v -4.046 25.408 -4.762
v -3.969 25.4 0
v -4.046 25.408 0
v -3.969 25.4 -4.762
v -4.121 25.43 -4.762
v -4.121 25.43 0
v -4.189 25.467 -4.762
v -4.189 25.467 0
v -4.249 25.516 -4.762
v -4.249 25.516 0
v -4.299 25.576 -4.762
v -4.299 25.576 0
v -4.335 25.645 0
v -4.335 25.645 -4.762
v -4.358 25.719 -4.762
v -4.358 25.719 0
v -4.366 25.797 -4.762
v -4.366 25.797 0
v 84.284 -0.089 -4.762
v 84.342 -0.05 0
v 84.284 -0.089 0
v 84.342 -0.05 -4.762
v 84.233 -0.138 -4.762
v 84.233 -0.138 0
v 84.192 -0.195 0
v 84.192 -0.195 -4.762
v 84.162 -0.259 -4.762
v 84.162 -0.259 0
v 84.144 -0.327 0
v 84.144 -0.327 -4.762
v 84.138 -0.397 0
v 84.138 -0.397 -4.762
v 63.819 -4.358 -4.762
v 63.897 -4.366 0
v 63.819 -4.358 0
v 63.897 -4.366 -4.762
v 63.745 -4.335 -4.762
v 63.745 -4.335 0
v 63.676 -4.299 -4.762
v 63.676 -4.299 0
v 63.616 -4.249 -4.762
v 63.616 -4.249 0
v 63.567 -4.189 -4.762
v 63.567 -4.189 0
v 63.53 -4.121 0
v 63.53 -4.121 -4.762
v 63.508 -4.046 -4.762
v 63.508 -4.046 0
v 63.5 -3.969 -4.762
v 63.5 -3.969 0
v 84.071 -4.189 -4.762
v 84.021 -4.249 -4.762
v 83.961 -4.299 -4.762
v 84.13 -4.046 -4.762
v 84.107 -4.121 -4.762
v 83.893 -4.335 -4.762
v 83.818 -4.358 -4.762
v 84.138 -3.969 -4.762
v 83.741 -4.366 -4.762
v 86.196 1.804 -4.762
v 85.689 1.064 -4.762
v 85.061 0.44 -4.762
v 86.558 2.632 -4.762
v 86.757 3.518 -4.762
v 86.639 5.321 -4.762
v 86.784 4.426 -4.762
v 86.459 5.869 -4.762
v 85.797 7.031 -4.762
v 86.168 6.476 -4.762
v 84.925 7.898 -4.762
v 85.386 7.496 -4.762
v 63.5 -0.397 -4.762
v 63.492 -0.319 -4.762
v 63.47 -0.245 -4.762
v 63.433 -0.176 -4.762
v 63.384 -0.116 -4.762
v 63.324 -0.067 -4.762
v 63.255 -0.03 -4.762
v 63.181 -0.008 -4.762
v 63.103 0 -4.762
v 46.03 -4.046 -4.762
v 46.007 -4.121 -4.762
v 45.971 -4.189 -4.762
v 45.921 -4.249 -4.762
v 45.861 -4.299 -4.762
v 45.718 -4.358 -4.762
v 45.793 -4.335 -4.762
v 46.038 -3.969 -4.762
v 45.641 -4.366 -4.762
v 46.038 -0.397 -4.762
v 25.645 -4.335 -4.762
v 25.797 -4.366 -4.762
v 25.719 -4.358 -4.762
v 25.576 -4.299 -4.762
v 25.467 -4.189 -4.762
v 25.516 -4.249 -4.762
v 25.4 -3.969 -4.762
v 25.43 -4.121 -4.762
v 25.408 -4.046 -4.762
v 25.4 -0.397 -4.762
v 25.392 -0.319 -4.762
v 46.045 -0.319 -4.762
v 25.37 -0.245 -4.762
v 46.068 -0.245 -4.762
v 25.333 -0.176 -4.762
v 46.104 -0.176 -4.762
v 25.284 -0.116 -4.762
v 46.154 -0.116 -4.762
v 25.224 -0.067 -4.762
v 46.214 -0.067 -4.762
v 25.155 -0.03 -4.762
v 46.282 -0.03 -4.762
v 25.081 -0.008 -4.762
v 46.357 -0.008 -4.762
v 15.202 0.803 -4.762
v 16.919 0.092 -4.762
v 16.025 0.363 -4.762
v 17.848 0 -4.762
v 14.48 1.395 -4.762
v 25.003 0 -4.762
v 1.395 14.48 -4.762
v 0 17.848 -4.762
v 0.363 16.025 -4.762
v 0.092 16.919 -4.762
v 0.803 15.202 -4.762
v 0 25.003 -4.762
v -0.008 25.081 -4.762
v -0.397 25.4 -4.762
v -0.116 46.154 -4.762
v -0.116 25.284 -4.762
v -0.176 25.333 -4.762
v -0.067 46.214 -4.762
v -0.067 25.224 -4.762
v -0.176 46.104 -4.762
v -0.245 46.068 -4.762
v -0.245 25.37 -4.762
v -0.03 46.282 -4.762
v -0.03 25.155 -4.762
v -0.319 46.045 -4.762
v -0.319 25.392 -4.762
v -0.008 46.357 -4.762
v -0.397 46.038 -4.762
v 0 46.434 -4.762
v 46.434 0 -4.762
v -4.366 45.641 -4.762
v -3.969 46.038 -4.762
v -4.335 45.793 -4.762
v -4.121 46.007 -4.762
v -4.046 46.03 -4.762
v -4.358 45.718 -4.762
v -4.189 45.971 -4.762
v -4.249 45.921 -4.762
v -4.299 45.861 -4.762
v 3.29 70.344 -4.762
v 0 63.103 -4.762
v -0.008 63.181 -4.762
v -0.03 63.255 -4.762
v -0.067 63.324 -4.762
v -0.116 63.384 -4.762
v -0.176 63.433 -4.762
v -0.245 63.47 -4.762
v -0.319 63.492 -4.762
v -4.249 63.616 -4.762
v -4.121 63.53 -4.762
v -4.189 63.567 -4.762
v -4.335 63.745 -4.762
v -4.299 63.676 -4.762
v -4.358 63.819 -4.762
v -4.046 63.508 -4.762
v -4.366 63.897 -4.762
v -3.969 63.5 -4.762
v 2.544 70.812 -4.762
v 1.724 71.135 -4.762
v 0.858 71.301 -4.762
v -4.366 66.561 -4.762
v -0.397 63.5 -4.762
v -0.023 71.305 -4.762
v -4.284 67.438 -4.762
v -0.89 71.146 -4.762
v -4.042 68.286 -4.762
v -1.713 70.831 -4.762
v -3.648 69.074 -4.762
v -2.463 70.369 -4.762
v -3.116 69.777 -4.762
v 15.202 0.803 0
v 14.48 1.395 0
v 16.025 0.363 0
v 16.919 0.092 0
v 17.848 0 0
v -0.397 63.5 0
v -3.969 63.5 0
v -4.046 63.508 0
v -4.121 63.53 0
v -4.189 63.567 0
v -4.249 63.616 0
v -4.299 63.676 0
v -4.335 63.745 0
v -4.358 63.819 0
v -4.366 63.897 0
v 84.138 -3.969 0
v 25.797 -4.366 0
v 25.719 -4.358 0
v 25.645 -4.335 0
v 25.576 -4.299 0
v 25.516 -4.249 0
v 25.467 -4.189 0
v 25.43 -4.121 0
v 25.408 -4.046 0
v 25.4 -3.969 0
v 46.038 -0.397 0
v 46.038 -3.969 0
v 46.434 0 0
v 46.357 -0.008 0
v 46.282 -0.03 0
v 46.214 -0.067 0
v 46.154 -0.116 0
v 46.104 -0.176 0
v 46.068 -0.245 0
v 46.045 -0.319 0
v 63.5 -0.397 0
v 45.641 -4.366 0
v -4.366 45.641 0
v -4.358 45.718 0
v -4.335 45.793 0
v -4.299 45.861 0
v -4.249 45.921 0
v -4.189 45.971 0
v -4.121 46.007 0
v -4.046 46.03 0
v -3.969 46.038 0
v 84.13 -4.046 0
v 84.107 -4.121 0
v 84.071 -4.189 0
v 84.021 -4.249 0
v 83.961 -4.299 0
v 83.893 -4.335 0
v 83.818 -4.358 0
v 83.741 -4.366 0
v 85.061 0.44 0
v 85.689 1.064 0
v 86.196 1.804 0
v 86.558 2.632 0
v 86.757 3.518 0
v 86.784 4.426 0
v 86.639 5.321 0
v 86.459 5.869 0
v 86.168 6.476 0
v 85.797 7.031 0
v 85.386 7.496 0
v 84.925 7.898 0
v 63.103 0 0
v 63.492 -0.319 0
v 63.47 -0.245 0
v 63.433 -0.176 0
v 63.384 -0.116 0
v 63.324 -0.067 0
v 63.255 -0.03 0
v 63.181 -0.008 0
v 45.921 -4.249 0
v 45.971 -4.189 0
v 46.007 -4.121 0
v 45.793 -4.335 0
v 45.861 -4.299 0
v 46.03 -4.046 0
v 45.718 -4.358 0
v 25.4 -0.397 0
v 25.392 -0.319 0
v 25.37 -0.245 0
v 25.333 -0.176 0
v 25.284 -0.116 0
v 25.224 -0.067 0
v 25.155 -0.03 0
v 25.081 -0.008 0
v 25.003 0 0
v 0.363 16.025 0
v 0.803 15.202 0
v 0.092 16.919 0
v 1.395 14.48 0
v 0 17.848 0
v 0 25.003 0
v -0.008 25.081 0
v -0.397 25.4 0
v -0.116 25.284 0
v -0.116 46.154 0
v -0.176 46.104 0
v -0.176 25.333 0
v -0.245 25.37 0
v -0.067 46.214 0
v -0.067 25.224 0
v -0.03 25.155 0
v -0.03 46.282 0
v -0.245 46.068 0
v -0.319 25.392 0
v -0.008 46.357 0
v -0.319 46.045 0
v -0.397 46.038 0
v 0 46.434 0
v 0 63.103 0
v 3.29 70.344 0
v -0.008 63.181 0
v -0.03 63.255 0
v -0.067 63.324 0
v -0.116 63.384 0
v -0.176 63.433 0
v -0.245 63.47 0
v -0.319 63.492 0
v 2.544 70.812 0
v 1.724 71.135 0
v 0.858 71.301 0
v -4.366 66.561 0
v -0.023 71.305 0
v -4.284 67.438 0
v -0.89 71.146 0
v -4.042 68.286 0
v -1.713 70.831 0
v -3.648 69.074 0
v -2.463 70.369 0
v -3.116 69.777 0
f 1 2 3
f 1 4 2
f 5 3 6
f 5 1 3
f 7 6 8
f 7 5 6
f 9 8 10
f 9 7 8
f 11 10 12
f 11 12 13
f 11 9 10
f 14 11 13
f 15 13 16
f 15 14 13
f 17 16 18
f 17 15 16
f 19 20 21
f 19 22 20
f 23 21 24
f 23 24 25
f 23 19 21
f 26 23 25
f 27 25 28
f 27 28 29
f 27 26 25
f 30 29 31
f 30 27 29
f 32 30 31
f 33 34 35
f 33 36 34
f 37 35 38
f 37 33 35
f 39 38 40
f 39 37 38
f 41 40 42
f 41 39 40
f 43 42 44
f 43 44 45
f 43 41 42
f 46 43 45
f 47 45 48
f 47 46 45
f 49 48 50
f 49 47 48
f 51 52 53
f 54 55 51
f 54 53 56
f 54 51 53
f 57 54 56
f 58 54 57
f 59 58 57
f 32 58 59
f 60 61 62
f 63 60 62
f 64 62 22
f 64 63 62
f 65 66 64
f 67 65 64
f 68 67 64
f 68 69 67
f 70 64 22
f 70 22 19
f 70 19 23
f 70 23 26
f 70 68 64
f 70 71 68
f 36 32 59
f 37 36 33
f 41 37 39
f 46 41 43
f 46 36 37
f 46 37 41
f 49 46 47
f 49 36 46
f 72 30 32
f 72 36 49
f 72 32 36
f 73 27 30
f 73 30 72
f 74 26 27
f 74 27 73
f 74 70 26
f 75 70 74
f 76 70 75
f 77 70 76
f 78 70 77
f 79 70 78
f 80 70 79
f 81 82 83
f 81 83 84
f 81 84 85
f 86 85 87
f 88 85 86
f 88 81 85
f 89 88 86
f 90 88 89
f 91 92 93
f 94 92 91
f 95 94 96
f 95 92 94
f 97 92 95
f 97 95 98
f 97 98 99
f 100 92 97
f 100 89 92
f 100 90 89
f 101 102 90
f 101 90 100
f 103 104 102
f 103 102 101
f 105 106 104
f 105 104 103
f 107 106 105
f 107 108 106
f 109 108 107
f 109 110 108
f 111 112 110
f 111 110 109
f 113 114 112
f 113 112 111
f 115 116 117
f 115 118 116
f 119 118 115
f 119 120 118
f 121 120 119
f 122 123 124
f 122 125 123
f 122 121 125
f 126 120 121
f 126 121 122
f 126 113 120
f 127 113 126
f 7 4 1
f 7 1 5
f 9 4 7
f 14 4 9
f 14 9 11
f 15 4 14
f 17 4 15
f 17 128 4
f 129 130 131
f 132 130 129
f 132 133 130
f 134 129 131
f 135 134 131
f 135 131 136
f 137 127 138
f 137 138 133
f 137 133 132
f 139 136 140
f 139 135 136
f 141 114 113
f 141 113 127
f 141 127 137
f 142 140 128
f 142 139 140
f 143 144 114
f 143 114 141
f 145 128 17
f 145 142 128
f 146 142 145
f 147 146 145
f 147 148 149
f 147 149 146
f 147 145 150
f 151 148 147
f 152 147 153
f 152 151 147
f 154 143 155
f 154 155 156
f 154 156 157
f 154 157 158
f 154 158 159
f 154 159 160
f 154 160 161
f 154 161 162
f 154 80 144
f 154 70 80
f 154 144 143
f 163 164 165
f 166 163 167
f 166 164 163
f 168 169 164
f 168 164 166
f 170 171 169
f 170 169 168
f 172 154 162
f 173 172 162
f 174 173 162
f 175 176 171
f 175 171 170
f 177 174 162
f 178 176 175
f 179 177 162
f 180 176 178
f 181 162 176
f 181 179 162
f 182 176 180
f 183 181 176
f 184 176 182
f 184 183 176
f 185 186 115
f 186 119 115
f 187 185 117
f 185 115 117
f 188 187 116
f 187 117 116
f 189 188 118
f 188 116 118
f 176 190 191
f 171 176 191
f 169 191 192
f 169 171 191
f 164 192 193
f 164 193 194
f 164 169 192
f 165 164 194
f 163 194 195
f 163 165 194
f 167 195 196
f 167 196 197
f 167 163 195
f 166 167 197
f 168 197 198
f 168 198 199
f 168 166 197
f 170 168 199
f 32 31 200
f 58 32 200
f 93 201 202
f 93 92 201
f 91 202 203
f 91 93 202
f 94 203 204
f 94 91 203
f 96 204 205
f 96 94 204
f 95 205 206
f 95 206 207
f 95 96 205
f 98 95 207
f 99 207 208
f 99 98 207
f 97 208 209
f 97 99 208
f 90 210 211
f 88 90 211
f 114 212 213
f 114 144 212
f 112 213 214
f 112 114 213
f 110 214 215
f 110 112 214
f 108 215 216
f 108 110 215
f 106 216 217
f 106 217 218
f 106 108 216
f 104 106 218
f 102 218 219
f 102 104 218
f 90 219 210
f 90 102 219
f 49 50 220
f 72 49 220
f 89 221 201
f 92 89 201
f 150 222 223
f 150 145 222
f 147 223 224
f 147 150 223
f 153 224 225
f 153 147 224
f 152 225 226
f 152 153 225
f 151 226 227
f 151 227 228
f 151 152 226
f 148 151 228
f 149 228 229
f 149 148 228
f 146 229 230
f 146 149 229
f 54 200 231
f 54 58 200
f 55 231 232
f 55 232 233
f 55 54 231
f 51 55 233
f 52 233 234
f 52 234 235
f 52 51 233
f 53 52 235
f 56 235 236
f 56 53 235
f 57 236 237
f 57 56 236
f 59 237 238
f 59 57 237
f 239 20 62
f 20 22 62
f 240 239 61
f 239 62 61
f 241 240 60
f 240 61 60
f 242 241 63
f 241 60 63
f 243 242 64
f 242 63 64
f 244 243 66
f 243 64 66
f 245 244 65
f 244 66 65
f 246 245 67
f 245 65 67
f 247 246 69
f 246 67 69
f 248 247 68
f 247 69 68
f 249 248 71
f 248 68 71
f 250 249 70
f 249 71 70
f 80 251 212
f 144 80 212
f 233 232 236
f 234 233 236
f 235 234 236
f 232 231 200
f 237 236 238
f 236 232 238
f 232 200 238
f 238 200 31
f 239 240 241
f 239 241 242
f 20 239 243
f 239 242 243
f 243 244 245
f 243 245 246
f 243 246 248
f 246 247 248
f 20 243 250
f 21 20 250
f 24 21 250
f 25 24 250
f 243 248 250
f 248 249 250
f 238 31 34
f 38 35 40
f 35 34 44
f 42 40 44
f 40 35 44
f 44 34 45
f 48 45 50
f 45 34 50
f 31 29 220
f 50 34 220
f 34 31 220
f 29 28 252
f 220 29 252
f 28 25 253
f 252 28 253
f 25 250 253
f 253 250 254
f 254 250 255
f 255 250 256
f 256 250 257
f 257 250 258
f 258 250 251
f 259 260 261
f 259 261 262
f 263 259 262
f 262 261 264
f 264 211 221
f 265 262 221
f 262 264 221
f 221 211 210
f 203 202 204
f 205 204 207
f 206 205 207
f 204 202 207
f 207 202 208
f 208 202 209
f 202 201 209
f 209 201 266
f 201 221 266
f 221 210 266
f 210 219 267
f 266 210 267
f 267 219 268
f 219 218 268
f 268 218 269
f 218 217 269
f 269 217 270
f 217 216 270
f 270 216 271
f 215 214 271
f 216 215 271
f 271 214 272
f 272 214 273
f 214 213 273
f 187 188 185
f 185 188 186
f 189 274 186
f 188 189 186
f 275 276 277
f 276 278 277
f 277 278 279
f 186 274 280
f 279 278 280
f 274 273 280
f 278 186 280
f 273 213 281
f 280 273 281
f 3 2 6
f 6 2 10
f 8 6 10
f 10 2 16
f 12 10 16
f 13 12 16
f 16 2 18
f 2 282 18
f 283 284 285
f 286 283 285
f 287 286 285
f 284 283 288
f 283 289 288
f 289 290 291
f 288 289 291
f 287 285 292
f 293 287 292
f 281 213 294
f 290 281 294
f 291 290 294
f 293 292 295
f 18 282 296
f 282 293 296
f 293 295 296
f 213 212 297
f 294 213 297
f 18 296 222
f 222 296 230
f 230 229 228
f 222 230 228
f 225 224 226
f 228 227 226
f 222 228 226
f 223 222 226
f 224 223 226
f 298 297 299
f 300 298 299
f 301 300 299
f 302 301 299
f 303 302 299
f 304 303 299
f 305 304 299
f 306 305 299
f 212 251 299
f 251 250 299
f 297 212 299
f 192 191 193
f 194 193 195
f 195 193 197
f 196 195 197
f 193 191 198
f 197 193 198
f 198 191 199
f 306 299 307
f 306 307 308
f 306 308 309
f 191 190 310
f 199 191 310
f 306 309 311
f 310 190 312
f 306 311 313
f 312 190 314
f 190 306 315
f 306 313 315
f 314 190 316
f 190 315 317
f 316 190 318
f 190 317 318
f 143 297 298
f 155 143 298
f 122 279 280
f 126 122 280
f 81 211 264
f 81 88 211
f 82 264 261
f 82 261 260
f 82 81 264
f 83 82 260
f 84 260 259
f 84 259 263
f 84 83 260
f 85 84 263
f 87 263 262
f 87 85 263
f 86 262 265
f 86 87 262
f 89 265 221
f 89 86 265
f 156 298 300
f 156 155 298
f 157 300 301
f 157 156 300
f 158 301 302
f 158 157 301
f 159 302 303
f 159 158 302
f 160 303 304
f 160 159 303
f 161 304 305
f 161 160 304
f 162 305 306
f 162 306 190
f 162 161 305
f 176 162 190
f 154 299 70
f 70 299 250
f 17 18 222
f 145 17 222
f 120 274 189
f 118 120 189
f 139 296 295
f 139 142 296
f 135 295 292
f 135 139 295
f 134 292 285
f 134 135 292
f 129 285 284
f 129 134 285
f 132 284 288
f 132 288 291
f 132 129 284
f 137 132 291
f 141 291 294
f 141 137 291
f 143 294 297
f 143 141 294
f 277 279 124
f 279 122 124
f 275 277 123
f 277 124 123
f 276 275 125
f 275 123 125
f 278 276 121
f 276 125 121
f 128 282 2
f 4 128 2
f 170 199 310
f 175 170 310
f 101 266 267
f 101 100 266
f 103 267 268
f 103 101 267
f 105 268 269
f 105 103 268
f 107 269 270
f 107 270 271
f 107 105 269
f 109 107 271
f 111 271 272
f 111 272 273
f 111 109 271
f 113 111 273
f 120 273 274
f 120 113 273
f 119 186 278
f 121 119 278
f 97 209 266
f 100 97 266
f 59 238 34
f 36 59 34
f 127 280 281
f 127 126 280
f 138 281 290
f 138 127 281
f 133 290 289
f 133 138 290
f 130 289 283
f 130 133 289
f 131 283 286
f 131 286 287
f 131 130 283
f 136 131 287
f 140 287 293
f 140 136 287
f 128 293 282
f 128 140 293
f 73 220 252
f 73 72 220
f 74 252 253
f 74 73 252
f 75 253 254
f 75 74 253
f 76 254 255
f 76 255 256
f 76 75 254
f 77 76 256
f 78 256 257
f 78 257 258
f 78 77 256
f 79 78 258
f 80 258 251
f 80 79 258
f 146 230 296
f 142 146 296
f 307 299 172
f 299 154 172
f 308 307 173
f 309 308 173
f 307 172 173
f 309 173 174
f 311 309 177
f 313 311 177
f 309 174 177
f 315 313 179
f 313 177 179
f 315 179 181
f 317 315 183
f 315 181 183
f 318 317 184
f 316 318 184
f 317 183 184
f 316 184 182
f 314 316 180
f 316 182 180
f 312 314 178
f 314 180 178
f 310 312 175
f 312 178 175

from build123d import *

# Parameters (mm, degrees)
BASE_FLANGE1_DEPTH = 4.7625
FILLET1_R          = 0.396875
FILLET2_R          = 4.7625


# Sheet-metal steps are written as plain solids
with BuildPart() as part:
    # Sketch1 → Base-Flange1 (new body)
    with BuildSketch(Plane.XY):
        Polygon((-4.365625, 76.2), (95.25, 0), (84.1375, 0), (84.1375, -4.365625), (63.5, -4.365625), (63.5, 0), (46.0375, 0), (46.0375, -4.365625), (25.4, -4.365625), (25.4, 0), (15.875, 0), (0, 15.875), (0, 25.4), (-4.365625, 25.4), (-4.365625, 46.0375), (0, 46.0375), (0, 63.5), (-4.365625, 63.5), align=None)
    extrude(amount=-BASE_FLANGE1_DEPTH)

    # Fillet1
    fillet1_edges = [part.edges().sort_by_distance(p)[0] for p in [
        (25.4, 0, -2.38125),
        (0, 25.4, -2.38125),
        (-4.365625, 25.4, -2.38125),
        (-4.365625, 46.0375, -2.38125),
        (0, 46.0375, -2.38125),
        (0, 63.5, -2.38125),
        (-4.365625, 63.5, -2.38125),
        (84.1375, 0, -2.38125),
        (84.1375, -4.365625, -2.38125),
        (63.5, -4.365625, -2.38125),
        (63.5, 0, -2.38125),
        (46.0375, 0, -2.38125),
        (46.0375, -4.365625, -2.38125),
        (25.4, -4.365625, -2.38125),
    ]]
    fillet(fillet1_edges, radius=FILLET1_R)

    # Fillet2
    fillet2_edges = [part.edges().sort_by_distance(p)[0] for p in [
        (95.25, 0, -2.38125),
        (15.875, 0, -2.38125),
        (0, 15.875, -2.38125),
        (-4.365625, 76.2, -2.38125),
    ]]
    fillet(fillet2_edges, radius=FILLET2_R)


solid = part.part
